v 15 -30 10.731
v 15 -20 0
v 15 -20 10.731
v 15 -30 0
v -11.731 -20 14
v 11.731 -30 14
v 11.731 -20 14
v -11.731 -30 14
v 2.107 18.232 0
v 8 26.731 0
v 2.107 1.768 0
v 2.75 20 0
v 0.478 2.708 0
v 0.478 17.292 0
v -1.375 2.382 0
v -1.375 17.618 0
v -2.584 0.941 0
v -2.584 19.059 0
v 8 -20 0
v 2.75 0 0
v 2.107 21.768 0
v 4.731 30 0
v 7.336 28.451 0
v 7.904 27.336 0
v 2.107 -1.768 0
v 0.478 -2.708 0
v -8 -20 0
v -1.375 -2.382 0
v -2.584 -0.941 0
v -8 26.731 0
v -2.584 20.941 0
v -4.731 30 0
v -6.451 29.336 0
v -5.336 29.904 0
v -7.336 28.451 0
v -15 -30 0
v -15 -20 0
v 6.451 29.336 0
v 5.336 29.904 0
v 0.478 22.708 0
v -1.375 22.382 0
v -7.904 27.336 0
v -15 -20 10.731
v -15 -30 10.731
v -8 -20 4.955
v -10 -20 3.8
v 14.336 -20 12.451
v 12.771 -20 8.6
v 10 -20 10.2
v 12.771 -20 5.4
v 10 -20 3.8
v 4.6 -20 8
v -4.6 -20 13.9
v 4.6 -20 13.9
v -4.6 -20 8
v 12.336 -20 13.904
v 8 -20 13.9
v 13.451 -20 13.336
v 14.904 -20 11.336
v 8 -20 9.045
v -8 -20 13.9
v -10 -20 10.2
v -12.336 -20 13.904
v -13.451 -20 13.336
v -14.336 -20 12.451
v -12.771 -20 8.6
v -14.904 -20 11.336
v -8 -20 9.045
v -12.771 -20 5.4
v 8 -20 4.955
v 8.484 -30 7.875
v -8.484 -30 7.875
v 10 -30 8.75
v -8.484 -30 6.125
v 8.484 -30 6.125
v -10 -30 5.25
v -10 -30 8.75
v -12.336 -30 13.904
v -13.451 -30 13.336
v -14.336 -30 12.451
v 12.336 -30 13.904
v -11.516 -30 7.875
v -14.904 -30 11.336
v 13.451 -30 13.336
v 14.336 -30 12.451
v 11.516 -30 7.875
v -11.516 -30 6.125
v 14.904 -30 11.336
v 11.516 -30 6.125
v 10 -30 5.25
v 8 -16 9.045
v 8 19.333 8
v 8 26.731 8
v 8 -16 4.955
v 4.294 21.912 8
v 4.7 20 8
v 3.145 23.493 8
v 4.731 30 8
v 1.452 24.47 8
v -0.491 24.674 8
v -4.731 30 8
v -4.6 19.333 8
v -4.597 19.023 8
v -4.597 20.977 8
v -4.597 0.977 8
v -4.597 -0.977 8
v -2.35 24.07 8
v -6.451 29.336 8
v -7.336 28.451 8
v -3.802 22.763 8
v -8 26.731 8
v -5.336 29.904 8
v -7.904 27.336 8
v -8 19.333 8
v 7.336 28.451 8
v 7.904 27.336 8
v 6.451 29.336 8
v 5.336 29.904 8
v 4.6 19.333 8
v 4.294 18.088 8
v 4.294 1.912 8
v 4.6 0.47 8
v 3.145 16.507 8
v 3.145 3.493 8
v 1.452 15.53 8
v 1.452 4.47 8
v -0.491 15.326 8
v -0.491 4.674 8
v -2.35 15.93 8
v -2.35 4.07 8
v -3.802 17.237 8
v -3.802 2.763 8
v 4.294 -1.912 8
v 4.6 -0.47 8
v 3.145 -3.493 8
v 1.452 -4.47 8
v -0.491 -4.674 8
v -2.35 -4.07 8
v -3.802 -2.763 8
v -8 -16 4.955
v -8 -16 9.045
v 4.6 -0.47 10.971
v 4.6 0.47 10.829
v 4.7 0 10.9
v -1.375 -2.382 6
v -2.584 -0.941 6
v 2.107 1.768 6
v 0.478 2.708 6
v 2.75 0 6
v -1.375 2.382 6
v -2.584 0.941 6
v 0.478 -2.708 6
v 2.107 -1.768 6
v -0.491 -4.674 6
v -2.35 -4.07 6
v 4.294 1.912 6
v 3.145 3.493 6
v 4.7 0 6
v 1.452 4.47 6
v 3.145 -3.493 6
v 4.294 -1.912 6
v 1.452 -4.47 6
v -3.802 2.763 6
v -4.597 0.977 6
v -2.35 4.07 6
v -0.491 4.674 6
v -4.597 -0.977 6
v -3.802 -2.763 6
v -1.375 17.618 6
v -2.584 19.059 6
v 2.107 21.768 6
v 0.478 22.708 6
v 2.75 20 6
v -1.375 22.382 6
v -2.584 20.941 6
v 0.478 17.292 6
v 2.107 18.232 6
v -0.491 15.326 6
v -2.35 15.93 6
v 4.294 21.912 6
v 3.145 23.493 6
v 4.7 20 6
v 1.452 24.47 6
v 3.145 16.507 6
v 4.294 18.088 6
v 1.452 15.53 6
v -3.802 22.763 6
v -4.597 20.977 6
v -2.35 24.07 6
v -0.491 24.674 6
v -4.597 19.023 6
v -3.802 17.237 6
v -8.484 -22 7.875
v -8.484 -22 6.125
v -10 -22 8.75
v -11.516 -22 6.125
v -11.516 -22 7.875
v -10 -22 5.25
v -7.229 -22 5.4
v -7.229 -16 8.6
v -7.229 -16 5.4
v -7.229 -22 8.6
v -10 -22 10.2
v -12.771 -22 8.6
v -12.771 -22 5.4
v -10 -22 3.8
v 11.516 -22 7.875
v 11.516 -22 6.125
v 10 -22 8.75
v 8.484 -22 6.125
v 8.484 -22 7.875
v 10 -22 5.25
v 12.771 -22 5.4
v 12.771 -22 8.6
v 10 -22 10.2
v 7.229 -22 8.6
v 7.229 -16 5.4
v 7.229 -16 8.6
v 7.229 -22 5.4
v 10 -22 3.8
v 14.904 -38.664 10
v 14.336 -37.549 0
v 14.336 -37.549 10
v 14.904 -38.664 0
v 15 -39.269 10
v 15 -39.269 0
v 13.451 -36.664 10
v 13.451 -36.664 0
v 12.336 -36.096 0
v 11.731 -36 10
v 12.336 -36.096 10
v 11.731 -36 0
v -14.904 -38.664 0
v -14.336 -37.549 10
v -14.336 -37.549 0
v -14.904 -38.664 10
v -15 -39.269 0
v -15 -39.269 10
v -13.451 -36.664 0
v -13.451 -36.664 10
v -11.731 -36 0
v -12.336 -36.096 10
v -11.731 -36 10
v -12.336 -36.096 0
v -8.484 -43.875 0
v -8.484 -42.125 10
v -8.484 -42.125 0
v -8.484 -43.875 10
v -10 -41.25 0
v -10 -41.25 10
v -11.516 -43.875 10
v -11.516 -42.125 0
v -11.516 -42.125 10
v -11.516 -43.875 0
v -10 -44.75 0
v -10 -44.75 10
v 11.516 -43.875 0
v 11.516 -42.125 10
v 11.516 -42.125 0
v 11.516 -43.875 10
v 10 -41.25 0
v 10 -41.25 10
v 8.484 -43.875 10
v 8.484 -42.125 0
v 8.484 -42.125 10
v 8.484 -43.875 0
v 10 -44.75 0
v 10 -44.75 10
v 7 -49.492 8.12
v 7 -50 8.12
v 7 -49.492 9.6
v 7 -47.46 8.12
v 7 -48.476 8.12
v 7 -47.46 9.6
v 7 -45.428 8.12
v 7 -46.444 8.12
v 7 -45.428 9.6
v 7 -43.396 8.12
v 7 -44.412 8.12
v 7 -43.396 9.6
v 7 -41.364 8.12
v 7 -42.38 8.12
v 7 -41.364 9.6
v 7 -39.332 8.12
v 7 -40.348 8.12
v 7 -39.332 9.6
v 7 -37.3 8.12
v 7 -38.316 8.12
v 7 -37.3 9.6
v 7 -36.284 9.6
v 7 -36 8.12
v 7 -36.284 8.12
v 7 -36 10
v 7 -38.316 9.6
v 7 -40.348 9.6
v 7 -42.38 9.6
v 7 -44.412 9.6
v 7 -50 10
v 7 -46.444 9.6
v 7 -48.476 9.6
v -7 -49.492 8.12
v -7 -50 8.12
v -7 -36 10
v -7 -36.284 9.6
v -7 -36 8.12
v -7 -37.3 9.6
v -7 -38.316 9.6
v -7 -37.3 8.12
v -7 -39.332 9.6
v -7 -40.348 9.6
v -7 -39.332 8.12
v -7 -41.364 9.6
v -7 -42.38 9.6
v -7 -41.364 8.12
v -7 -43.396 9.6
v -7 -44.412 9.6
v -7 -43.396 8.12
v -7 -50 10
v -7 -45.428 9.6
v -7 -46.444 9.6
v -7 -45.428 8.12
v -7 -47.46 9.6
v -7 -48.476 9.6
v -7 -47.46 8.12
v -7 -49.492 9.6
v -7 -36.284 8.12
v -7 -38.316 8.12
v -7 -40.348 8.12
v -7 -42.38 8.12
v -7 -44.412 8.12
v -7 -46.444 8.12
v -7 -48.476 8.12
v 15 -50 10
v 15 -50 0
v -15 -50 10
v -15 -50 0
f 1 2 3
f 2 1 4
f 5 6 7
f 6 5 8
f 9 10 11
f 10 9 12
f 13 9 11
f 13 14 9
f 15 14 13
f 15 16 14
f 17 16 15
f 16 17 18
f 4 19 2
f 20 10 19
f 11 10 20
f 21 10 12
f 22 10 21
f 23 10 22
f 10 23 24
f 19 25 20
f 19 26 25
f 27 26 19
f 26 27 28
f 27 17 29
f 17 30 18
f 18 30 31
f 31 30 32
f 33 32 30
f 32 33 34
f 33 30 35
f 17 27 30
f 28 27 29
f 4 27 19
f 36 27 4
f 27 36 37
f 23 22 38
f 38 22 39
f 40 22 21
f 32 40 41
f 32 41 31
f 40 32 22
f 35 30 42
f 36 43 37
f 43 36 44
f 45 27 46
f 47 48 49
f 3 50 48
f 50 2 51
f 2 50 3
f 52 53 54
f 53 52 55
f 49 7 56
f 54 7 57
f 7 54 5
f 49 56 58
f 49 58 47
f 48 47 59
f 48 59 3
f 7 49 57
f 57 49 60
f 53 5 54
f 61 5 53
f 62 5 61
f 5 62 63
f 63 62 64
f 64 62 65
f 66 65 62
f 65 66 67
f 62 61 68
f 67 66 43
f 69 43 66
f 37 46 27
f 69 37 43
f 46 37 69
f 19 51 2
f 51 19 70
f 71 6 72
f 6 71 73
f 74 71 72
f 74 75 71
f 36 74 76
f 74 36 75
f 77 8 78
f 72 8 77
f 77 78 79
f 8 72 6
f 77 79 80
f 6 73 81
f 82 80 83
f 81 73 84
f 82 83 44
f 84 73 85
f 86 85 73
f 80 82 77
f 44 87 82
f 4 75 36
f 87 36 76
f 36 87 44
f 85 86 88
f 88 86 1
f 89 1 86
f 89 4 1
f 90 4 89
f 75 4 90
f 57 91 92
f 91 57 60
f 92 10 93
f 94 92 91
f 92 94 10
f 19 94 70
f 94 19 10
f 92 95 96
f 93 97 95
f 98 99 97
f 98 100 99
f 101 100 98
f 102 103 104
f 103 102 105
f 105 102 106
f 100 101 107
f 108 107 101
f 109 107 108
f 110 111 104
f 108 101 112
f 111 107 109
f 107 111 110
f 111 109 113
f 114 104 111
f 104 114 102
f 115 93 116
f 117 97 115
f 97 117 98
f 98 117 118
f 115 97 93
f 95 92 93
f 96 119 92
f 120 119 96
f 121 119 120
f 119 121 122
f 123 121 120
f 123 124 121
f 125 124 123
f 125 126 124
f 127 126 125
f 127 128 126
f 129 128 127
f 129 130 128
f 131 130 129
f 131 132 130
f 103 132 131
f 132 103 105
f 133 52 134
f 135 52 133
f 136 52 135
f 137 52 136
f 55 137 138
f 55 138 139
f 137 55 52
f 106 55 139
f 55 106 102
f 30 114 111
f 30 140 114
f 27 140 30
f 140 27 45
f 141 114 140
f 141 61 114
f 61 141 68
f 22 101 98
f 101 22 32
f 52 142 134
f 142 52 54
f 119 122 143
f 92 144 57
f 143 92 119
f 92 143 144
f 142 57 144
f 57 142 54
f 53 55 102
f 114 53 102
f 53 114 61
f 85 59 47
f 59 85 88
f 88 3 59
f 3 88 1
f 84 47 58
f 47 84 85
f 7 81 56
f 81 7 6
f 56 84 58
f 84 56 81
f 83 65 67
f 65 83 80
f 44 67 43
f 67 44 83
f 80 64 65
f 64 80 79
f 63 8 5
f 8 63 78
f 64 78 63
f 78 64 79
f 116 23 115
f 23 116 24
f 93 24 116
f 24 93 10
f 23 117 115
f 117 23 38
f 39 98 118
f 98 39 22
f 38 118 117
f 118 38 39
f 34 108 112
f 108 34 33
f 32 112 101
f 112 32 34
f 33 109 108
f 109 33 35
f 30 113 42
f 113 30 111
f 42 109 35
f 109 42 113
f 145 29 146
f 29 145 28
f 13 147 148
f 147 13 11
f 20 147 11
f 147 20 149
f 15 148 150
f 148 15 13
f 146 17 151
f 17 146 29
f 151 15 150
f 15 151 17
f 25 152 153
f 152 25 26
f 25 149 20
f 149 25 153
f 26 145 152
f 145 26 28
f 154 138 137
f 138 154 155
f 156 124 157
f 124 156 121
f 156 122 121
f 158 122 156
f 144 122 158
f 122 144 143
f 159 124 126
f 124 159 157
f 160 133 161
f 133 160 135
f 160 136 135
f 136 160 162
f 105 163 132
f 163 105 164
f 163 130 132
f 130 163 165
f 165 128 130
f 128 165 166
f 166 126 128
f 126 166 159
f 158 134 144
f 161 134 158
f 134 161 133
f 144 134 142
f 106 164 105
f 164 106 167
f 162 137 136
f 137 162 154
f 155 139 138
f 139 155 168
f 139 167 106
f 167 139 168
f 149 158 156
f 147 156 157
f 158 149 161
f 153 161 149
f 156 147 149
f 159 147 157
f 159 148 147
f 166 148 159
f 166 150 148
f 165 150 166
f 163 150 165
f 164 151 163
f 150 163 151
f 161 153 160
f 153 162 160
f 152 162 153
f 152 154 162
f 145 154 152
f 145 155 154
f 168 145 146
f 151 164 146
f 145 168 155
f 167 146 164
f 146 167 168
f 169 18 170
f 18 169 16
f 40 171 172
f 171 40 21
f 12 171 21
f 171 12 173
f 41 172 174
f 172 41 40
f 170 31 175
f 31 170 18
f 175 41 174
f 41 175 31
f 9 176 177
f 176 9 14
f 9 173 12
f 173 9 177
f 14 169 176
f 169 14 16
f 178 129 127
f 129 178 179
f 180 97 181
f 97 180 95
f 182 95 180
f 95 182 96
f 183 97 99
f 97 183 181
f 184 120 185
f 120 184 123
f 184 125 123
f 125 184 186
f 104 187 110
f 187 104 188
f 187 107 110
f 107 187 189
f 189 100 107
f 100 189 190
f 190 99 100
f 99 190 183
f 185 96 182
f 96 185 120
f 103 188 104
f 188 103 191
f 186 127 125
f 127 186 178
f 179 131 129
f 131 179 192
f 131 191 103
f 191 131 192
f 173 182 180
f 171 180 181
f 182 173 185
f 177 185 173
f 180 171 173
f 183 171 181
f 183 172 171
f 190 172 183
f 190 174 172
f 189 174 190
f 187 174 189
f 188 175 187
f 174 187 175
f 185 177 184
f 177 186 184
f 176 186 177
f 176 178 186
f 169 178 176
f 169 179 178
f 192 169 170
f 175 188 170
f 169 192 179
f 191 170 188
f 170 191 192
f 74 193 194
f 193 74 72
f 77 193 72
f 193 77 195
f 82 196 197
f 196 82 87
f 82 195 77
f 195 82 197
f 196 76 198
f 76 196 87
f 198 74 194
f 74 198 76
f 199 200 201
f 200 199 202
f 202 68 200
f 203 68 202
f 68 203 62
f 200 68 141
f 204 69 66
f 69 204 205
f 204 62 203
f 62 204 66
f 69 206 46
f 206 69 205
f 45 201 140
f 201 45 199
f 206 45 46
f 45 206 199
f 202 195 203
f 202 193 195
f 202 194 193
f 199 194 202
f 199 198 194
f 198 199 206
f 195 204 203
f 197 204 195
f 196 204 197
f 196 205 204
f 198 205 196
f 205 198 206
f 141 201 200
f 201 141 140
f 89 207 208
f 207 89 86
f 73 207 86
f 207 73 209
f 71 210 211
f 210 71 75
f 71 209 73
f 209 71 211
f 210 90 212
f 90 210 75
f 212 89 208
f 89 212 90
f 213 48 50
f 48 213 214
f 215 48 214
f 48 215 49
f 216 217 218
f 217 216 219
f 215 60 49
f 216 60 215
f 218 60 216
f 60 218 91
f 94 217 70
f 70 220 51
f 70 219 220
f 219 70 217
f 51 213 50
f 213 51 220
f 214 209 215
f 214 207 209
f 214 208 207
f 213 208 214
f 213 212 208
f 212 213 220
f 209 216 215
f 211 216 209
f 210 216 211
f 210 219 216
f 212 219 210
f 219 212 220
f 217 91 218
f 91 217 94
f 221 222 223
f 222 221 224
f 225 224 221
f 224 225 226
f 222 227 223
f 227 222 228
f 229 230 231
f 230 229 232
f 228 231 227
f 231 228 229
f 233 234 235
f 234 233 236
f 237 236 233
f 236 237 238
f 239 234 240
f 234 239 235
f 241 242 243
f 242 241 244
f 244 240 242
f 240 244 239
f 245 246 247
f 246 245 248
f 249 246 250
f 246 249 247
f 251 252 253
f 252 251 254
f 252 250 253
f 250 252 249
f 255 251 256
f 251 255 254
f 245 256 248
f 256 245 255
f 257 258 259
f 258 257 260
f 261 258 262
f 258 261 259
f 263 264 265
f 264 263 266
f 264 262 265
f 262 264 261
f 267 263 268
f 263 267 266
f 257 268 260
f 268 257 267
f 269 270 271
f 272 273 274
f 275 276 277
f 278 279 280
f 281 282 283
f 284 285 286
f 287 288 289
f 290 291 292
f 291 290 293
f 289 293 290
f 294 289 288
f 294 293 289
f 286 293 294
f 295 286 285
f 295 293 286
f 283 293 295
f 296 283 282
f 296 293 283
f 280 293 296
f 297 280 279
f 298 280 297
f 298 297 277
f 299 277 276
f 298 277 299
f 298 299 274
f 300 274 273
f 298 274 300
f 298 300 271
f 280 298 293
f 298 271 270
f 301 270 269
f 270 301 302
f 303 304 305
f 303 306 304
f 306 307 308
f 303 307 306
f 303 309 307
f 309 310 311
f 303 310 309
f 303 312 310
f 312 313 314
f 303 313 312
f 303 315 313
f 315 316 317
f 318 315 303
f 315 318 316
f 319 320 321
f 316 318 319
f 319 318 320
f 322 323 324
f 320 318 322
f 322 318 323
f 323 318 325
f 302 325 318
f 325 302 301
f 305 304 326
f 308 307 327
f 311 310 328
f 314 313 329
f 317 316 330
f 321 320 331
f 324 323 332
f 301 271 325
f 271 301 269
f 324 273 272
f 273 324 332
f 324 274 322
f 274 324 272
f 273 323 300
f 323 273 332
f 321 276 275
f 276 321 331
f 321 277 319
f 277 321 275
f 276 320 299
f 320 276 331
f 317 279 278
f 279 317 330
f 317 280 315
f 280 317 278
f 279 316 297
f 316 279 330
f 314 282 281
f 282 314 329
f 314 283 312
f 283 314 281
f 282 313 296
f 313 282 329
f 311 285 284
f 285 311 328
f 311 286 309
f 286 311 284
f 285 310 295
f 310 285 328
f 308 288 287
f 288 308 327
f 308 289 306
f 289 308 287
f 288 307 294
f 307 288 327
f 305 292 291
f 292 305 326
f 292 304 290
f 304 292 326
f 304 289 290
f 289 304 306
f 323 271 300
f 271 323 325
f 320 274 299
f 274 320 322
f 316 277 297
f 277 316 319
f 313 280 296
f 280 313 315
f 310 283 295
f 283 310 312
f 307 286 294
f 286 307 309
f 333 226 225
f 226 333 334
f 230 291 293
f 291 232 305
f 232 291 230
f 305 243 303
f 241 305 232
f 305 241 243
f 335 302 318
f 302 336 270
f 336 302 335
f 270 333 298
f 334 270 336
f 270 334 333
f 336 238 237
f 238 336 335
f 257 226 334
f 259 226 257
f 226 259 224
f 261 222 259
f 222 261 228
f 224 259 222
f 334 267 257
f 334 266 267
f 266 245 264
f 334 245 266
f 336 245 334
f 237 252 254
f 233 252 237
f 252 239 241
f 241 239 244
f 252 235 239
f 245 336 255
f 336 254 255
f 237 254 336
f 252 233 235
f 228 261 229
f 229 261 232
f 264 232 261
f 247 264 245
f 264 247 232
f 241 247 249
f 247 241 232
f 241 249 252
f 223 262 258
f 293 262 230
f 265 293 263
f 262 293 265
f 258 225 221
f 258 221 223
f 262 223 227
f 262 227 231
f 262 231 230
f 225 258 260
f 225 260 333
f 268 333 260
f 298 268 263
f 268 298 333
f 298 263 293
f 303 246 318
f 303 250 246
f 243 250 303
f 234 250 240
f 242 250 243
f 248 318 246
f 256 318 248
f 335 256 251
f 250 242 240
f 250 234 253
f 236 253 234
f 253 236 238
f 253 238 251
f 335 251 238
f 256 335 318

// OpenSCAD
// This printed part is one possible way to anchor Shapeoko belts.
// See http://www.shapeoko.com/wiki/index.php/Belt_Anchors for other ideas.
// Motivated by http://www.thingiverse.com/thing:33881 not being strong enough
// when I initially printed it.

// Upright: printed, but not stress tested, looks sturdy
// Top: completely untested

gThick = 8;
gRibHeight = 6;
gTopRoundoverRadius = 4;
gSideRoundoverRadius = 4;
gMainWidth = 16;
gTopWidth = 30;
gRibWidth = 3.4;
gHoleSpacing = 20;
gBeltWide = 14; // 1/4" belt + slop
gBeltPitch = 2.032; // MXL in mm
gBeltThick = 1.5;
e = 0.02;

// screw_clearance_diameter, socket_head_clearance_diameter, nut outside diameter
// TODO untested numbers, these should move to a common include.
M3 = [3.5, 6.4, 6.4];
M5 = [5.5, 9.4, 9.4];
M8 = [8, 13, 13];

module InsetHole(x) {
  d = x[0];
  socket_head = x[1];
  union() {
    translate([0,0,-50]) cylinder(r=d/2, h=100);
    cylinder(r=socket_head/2, h=10);
  }
}

module NutHole(x) {
  d = x[0];
  nut_size = x[2];
  union() {
    translate([0,0,1]) cylinder(r=d/2, h=50);
    cylinder(r=nut_size/2, $fn=6, h=6);
  }
}

module Rib(t=4) {
  translate([-t/2,0,-0.1])
    rotate([90,0,90])
      linear_extrude(height=t)
        polygon(points=[[0,0],[40,0],[0,gRibHeight]],paths=[[0,1,2]]);
}

module Roundover(r) {
  translate([0.1,0.1,-50])
    difference() {
      cube([r,r,100]);
      translate([0,0,-1]) cylinder(r=r,h=102,$fn=20);
    }
}

module Upright() {
  difference() {
    union() {
      // body, for now (until beziers work)
      translate([0,-25,(gThick+gRibHeight)/2]) cube([gTopWidth,10,gThick+gRibHeight], center=true);
      translate([0,0,gThick/2]) cube([gMainWidth,60,gThick], center=true);
      // ribs
      translate([(gMainWidth-gRibWidth)/2,-20,gThick]) Rib(t=gRibWidth);
      translate([-(gMainWidth-gRibWidth)/2,-20,gThick]) Rib(t=gRibWidth);
    }
    // Chamfer top edges
    // TODO make these translation numbers constants as well, and fix Roundover's
    // origin.
    translate([gTopWidth/2-gTopRoundoverRadius,0,gThick+gRibHeight-gTopRoundoverRadius])
      rotate([90,0,0])
        Roundover(r=gTopRoundoverRadius);
    translate([-(gTopWidth/2-gTopRoundoverRadius),0,gThick+gRibHeight-gTopRoundoverRadius])
      rotate([90,0,180])
        Roundover(r=gTopRoundoverRadius);
    // Chamfer edges near bottom mounting hole
    translate([gMainWidth/2-gSideRoundoverRadius,26,0])
      Roundover(r=gSideRoundoverRadius);
    translate([-(gMainWidth/2-gSideRoundoverRadius),26,0])
      rotate([0,0,90])
        Roundover(r=gSideRoundoverRadius);
    // M5 mounting holes
    translate([0,0,gThick-2]) InsetHole(M5);
    translate([0,20,gThick-2]) InsetHole(M5);
    // M3 nut traps (20mm spacing, for compat with old part)
    translate([-gHoleSpacing/2,-16,(gThick+gRibHeight)/2]) rotate([90,-90,0]) NutHole(M3);
    translate([gHoleSpacing/2,-16,(gThick+gRibHeight)/2]) rotate([90,-90,0]) NutHole(M3);
  }
}

module Belt() {
  translate([0,0,gBeltThick/2]) cube([gBeltWide,30,gBeltThick], center=true);
  for(i = [0:30/gBeltPitch]) {
    translate([0,i * gBeltPitch,-gBeltThick/2+e]) cube([gBeltWide,gBeltPitch / 2,gBeltThick], center=true);
  }
}

module Top() {
  rotate([-90,0,0]) difference() {
    translate([0,-5,(gThick+gRibHeight)/2]) cube([gTopWidth,10,gThick+gRibHeight], center=true);
    // holes
    translate([-gHoleSpacing/2,20,(gThick+gRibHeight)/2]) rotate([90,-90,0]) NutHole(M3);
    translate([gHoleSpacing/2,20,(gThick+gRibHeight)/2]) rotate([90,-90,0]) NutHole(M3);
    // chamfer
    translate([gTopWidth/2-gTopRoundoverRadius,0,gThick+gRibHeight-gTopRoundoverRadius])
      rotate([90,0,0])
        Roundover(r=gTopRoundoverRadius);
    translate([-(gTopWidth/2-gTopRoundoverRadius),0,gThick+gRibHeight-gTopRoundoverRadius])
      rotate([90,0,180])
        Roundover(r=gTopRoundoverRadius);
    // TODO remove 12 as magic number
    translate([0,-12+(1.6*gBeltThick),0]) rotate([90,0,0]) Belt();
  }
}

union() {
  Upright();
  translate([0,-50,0]) Top();
}
